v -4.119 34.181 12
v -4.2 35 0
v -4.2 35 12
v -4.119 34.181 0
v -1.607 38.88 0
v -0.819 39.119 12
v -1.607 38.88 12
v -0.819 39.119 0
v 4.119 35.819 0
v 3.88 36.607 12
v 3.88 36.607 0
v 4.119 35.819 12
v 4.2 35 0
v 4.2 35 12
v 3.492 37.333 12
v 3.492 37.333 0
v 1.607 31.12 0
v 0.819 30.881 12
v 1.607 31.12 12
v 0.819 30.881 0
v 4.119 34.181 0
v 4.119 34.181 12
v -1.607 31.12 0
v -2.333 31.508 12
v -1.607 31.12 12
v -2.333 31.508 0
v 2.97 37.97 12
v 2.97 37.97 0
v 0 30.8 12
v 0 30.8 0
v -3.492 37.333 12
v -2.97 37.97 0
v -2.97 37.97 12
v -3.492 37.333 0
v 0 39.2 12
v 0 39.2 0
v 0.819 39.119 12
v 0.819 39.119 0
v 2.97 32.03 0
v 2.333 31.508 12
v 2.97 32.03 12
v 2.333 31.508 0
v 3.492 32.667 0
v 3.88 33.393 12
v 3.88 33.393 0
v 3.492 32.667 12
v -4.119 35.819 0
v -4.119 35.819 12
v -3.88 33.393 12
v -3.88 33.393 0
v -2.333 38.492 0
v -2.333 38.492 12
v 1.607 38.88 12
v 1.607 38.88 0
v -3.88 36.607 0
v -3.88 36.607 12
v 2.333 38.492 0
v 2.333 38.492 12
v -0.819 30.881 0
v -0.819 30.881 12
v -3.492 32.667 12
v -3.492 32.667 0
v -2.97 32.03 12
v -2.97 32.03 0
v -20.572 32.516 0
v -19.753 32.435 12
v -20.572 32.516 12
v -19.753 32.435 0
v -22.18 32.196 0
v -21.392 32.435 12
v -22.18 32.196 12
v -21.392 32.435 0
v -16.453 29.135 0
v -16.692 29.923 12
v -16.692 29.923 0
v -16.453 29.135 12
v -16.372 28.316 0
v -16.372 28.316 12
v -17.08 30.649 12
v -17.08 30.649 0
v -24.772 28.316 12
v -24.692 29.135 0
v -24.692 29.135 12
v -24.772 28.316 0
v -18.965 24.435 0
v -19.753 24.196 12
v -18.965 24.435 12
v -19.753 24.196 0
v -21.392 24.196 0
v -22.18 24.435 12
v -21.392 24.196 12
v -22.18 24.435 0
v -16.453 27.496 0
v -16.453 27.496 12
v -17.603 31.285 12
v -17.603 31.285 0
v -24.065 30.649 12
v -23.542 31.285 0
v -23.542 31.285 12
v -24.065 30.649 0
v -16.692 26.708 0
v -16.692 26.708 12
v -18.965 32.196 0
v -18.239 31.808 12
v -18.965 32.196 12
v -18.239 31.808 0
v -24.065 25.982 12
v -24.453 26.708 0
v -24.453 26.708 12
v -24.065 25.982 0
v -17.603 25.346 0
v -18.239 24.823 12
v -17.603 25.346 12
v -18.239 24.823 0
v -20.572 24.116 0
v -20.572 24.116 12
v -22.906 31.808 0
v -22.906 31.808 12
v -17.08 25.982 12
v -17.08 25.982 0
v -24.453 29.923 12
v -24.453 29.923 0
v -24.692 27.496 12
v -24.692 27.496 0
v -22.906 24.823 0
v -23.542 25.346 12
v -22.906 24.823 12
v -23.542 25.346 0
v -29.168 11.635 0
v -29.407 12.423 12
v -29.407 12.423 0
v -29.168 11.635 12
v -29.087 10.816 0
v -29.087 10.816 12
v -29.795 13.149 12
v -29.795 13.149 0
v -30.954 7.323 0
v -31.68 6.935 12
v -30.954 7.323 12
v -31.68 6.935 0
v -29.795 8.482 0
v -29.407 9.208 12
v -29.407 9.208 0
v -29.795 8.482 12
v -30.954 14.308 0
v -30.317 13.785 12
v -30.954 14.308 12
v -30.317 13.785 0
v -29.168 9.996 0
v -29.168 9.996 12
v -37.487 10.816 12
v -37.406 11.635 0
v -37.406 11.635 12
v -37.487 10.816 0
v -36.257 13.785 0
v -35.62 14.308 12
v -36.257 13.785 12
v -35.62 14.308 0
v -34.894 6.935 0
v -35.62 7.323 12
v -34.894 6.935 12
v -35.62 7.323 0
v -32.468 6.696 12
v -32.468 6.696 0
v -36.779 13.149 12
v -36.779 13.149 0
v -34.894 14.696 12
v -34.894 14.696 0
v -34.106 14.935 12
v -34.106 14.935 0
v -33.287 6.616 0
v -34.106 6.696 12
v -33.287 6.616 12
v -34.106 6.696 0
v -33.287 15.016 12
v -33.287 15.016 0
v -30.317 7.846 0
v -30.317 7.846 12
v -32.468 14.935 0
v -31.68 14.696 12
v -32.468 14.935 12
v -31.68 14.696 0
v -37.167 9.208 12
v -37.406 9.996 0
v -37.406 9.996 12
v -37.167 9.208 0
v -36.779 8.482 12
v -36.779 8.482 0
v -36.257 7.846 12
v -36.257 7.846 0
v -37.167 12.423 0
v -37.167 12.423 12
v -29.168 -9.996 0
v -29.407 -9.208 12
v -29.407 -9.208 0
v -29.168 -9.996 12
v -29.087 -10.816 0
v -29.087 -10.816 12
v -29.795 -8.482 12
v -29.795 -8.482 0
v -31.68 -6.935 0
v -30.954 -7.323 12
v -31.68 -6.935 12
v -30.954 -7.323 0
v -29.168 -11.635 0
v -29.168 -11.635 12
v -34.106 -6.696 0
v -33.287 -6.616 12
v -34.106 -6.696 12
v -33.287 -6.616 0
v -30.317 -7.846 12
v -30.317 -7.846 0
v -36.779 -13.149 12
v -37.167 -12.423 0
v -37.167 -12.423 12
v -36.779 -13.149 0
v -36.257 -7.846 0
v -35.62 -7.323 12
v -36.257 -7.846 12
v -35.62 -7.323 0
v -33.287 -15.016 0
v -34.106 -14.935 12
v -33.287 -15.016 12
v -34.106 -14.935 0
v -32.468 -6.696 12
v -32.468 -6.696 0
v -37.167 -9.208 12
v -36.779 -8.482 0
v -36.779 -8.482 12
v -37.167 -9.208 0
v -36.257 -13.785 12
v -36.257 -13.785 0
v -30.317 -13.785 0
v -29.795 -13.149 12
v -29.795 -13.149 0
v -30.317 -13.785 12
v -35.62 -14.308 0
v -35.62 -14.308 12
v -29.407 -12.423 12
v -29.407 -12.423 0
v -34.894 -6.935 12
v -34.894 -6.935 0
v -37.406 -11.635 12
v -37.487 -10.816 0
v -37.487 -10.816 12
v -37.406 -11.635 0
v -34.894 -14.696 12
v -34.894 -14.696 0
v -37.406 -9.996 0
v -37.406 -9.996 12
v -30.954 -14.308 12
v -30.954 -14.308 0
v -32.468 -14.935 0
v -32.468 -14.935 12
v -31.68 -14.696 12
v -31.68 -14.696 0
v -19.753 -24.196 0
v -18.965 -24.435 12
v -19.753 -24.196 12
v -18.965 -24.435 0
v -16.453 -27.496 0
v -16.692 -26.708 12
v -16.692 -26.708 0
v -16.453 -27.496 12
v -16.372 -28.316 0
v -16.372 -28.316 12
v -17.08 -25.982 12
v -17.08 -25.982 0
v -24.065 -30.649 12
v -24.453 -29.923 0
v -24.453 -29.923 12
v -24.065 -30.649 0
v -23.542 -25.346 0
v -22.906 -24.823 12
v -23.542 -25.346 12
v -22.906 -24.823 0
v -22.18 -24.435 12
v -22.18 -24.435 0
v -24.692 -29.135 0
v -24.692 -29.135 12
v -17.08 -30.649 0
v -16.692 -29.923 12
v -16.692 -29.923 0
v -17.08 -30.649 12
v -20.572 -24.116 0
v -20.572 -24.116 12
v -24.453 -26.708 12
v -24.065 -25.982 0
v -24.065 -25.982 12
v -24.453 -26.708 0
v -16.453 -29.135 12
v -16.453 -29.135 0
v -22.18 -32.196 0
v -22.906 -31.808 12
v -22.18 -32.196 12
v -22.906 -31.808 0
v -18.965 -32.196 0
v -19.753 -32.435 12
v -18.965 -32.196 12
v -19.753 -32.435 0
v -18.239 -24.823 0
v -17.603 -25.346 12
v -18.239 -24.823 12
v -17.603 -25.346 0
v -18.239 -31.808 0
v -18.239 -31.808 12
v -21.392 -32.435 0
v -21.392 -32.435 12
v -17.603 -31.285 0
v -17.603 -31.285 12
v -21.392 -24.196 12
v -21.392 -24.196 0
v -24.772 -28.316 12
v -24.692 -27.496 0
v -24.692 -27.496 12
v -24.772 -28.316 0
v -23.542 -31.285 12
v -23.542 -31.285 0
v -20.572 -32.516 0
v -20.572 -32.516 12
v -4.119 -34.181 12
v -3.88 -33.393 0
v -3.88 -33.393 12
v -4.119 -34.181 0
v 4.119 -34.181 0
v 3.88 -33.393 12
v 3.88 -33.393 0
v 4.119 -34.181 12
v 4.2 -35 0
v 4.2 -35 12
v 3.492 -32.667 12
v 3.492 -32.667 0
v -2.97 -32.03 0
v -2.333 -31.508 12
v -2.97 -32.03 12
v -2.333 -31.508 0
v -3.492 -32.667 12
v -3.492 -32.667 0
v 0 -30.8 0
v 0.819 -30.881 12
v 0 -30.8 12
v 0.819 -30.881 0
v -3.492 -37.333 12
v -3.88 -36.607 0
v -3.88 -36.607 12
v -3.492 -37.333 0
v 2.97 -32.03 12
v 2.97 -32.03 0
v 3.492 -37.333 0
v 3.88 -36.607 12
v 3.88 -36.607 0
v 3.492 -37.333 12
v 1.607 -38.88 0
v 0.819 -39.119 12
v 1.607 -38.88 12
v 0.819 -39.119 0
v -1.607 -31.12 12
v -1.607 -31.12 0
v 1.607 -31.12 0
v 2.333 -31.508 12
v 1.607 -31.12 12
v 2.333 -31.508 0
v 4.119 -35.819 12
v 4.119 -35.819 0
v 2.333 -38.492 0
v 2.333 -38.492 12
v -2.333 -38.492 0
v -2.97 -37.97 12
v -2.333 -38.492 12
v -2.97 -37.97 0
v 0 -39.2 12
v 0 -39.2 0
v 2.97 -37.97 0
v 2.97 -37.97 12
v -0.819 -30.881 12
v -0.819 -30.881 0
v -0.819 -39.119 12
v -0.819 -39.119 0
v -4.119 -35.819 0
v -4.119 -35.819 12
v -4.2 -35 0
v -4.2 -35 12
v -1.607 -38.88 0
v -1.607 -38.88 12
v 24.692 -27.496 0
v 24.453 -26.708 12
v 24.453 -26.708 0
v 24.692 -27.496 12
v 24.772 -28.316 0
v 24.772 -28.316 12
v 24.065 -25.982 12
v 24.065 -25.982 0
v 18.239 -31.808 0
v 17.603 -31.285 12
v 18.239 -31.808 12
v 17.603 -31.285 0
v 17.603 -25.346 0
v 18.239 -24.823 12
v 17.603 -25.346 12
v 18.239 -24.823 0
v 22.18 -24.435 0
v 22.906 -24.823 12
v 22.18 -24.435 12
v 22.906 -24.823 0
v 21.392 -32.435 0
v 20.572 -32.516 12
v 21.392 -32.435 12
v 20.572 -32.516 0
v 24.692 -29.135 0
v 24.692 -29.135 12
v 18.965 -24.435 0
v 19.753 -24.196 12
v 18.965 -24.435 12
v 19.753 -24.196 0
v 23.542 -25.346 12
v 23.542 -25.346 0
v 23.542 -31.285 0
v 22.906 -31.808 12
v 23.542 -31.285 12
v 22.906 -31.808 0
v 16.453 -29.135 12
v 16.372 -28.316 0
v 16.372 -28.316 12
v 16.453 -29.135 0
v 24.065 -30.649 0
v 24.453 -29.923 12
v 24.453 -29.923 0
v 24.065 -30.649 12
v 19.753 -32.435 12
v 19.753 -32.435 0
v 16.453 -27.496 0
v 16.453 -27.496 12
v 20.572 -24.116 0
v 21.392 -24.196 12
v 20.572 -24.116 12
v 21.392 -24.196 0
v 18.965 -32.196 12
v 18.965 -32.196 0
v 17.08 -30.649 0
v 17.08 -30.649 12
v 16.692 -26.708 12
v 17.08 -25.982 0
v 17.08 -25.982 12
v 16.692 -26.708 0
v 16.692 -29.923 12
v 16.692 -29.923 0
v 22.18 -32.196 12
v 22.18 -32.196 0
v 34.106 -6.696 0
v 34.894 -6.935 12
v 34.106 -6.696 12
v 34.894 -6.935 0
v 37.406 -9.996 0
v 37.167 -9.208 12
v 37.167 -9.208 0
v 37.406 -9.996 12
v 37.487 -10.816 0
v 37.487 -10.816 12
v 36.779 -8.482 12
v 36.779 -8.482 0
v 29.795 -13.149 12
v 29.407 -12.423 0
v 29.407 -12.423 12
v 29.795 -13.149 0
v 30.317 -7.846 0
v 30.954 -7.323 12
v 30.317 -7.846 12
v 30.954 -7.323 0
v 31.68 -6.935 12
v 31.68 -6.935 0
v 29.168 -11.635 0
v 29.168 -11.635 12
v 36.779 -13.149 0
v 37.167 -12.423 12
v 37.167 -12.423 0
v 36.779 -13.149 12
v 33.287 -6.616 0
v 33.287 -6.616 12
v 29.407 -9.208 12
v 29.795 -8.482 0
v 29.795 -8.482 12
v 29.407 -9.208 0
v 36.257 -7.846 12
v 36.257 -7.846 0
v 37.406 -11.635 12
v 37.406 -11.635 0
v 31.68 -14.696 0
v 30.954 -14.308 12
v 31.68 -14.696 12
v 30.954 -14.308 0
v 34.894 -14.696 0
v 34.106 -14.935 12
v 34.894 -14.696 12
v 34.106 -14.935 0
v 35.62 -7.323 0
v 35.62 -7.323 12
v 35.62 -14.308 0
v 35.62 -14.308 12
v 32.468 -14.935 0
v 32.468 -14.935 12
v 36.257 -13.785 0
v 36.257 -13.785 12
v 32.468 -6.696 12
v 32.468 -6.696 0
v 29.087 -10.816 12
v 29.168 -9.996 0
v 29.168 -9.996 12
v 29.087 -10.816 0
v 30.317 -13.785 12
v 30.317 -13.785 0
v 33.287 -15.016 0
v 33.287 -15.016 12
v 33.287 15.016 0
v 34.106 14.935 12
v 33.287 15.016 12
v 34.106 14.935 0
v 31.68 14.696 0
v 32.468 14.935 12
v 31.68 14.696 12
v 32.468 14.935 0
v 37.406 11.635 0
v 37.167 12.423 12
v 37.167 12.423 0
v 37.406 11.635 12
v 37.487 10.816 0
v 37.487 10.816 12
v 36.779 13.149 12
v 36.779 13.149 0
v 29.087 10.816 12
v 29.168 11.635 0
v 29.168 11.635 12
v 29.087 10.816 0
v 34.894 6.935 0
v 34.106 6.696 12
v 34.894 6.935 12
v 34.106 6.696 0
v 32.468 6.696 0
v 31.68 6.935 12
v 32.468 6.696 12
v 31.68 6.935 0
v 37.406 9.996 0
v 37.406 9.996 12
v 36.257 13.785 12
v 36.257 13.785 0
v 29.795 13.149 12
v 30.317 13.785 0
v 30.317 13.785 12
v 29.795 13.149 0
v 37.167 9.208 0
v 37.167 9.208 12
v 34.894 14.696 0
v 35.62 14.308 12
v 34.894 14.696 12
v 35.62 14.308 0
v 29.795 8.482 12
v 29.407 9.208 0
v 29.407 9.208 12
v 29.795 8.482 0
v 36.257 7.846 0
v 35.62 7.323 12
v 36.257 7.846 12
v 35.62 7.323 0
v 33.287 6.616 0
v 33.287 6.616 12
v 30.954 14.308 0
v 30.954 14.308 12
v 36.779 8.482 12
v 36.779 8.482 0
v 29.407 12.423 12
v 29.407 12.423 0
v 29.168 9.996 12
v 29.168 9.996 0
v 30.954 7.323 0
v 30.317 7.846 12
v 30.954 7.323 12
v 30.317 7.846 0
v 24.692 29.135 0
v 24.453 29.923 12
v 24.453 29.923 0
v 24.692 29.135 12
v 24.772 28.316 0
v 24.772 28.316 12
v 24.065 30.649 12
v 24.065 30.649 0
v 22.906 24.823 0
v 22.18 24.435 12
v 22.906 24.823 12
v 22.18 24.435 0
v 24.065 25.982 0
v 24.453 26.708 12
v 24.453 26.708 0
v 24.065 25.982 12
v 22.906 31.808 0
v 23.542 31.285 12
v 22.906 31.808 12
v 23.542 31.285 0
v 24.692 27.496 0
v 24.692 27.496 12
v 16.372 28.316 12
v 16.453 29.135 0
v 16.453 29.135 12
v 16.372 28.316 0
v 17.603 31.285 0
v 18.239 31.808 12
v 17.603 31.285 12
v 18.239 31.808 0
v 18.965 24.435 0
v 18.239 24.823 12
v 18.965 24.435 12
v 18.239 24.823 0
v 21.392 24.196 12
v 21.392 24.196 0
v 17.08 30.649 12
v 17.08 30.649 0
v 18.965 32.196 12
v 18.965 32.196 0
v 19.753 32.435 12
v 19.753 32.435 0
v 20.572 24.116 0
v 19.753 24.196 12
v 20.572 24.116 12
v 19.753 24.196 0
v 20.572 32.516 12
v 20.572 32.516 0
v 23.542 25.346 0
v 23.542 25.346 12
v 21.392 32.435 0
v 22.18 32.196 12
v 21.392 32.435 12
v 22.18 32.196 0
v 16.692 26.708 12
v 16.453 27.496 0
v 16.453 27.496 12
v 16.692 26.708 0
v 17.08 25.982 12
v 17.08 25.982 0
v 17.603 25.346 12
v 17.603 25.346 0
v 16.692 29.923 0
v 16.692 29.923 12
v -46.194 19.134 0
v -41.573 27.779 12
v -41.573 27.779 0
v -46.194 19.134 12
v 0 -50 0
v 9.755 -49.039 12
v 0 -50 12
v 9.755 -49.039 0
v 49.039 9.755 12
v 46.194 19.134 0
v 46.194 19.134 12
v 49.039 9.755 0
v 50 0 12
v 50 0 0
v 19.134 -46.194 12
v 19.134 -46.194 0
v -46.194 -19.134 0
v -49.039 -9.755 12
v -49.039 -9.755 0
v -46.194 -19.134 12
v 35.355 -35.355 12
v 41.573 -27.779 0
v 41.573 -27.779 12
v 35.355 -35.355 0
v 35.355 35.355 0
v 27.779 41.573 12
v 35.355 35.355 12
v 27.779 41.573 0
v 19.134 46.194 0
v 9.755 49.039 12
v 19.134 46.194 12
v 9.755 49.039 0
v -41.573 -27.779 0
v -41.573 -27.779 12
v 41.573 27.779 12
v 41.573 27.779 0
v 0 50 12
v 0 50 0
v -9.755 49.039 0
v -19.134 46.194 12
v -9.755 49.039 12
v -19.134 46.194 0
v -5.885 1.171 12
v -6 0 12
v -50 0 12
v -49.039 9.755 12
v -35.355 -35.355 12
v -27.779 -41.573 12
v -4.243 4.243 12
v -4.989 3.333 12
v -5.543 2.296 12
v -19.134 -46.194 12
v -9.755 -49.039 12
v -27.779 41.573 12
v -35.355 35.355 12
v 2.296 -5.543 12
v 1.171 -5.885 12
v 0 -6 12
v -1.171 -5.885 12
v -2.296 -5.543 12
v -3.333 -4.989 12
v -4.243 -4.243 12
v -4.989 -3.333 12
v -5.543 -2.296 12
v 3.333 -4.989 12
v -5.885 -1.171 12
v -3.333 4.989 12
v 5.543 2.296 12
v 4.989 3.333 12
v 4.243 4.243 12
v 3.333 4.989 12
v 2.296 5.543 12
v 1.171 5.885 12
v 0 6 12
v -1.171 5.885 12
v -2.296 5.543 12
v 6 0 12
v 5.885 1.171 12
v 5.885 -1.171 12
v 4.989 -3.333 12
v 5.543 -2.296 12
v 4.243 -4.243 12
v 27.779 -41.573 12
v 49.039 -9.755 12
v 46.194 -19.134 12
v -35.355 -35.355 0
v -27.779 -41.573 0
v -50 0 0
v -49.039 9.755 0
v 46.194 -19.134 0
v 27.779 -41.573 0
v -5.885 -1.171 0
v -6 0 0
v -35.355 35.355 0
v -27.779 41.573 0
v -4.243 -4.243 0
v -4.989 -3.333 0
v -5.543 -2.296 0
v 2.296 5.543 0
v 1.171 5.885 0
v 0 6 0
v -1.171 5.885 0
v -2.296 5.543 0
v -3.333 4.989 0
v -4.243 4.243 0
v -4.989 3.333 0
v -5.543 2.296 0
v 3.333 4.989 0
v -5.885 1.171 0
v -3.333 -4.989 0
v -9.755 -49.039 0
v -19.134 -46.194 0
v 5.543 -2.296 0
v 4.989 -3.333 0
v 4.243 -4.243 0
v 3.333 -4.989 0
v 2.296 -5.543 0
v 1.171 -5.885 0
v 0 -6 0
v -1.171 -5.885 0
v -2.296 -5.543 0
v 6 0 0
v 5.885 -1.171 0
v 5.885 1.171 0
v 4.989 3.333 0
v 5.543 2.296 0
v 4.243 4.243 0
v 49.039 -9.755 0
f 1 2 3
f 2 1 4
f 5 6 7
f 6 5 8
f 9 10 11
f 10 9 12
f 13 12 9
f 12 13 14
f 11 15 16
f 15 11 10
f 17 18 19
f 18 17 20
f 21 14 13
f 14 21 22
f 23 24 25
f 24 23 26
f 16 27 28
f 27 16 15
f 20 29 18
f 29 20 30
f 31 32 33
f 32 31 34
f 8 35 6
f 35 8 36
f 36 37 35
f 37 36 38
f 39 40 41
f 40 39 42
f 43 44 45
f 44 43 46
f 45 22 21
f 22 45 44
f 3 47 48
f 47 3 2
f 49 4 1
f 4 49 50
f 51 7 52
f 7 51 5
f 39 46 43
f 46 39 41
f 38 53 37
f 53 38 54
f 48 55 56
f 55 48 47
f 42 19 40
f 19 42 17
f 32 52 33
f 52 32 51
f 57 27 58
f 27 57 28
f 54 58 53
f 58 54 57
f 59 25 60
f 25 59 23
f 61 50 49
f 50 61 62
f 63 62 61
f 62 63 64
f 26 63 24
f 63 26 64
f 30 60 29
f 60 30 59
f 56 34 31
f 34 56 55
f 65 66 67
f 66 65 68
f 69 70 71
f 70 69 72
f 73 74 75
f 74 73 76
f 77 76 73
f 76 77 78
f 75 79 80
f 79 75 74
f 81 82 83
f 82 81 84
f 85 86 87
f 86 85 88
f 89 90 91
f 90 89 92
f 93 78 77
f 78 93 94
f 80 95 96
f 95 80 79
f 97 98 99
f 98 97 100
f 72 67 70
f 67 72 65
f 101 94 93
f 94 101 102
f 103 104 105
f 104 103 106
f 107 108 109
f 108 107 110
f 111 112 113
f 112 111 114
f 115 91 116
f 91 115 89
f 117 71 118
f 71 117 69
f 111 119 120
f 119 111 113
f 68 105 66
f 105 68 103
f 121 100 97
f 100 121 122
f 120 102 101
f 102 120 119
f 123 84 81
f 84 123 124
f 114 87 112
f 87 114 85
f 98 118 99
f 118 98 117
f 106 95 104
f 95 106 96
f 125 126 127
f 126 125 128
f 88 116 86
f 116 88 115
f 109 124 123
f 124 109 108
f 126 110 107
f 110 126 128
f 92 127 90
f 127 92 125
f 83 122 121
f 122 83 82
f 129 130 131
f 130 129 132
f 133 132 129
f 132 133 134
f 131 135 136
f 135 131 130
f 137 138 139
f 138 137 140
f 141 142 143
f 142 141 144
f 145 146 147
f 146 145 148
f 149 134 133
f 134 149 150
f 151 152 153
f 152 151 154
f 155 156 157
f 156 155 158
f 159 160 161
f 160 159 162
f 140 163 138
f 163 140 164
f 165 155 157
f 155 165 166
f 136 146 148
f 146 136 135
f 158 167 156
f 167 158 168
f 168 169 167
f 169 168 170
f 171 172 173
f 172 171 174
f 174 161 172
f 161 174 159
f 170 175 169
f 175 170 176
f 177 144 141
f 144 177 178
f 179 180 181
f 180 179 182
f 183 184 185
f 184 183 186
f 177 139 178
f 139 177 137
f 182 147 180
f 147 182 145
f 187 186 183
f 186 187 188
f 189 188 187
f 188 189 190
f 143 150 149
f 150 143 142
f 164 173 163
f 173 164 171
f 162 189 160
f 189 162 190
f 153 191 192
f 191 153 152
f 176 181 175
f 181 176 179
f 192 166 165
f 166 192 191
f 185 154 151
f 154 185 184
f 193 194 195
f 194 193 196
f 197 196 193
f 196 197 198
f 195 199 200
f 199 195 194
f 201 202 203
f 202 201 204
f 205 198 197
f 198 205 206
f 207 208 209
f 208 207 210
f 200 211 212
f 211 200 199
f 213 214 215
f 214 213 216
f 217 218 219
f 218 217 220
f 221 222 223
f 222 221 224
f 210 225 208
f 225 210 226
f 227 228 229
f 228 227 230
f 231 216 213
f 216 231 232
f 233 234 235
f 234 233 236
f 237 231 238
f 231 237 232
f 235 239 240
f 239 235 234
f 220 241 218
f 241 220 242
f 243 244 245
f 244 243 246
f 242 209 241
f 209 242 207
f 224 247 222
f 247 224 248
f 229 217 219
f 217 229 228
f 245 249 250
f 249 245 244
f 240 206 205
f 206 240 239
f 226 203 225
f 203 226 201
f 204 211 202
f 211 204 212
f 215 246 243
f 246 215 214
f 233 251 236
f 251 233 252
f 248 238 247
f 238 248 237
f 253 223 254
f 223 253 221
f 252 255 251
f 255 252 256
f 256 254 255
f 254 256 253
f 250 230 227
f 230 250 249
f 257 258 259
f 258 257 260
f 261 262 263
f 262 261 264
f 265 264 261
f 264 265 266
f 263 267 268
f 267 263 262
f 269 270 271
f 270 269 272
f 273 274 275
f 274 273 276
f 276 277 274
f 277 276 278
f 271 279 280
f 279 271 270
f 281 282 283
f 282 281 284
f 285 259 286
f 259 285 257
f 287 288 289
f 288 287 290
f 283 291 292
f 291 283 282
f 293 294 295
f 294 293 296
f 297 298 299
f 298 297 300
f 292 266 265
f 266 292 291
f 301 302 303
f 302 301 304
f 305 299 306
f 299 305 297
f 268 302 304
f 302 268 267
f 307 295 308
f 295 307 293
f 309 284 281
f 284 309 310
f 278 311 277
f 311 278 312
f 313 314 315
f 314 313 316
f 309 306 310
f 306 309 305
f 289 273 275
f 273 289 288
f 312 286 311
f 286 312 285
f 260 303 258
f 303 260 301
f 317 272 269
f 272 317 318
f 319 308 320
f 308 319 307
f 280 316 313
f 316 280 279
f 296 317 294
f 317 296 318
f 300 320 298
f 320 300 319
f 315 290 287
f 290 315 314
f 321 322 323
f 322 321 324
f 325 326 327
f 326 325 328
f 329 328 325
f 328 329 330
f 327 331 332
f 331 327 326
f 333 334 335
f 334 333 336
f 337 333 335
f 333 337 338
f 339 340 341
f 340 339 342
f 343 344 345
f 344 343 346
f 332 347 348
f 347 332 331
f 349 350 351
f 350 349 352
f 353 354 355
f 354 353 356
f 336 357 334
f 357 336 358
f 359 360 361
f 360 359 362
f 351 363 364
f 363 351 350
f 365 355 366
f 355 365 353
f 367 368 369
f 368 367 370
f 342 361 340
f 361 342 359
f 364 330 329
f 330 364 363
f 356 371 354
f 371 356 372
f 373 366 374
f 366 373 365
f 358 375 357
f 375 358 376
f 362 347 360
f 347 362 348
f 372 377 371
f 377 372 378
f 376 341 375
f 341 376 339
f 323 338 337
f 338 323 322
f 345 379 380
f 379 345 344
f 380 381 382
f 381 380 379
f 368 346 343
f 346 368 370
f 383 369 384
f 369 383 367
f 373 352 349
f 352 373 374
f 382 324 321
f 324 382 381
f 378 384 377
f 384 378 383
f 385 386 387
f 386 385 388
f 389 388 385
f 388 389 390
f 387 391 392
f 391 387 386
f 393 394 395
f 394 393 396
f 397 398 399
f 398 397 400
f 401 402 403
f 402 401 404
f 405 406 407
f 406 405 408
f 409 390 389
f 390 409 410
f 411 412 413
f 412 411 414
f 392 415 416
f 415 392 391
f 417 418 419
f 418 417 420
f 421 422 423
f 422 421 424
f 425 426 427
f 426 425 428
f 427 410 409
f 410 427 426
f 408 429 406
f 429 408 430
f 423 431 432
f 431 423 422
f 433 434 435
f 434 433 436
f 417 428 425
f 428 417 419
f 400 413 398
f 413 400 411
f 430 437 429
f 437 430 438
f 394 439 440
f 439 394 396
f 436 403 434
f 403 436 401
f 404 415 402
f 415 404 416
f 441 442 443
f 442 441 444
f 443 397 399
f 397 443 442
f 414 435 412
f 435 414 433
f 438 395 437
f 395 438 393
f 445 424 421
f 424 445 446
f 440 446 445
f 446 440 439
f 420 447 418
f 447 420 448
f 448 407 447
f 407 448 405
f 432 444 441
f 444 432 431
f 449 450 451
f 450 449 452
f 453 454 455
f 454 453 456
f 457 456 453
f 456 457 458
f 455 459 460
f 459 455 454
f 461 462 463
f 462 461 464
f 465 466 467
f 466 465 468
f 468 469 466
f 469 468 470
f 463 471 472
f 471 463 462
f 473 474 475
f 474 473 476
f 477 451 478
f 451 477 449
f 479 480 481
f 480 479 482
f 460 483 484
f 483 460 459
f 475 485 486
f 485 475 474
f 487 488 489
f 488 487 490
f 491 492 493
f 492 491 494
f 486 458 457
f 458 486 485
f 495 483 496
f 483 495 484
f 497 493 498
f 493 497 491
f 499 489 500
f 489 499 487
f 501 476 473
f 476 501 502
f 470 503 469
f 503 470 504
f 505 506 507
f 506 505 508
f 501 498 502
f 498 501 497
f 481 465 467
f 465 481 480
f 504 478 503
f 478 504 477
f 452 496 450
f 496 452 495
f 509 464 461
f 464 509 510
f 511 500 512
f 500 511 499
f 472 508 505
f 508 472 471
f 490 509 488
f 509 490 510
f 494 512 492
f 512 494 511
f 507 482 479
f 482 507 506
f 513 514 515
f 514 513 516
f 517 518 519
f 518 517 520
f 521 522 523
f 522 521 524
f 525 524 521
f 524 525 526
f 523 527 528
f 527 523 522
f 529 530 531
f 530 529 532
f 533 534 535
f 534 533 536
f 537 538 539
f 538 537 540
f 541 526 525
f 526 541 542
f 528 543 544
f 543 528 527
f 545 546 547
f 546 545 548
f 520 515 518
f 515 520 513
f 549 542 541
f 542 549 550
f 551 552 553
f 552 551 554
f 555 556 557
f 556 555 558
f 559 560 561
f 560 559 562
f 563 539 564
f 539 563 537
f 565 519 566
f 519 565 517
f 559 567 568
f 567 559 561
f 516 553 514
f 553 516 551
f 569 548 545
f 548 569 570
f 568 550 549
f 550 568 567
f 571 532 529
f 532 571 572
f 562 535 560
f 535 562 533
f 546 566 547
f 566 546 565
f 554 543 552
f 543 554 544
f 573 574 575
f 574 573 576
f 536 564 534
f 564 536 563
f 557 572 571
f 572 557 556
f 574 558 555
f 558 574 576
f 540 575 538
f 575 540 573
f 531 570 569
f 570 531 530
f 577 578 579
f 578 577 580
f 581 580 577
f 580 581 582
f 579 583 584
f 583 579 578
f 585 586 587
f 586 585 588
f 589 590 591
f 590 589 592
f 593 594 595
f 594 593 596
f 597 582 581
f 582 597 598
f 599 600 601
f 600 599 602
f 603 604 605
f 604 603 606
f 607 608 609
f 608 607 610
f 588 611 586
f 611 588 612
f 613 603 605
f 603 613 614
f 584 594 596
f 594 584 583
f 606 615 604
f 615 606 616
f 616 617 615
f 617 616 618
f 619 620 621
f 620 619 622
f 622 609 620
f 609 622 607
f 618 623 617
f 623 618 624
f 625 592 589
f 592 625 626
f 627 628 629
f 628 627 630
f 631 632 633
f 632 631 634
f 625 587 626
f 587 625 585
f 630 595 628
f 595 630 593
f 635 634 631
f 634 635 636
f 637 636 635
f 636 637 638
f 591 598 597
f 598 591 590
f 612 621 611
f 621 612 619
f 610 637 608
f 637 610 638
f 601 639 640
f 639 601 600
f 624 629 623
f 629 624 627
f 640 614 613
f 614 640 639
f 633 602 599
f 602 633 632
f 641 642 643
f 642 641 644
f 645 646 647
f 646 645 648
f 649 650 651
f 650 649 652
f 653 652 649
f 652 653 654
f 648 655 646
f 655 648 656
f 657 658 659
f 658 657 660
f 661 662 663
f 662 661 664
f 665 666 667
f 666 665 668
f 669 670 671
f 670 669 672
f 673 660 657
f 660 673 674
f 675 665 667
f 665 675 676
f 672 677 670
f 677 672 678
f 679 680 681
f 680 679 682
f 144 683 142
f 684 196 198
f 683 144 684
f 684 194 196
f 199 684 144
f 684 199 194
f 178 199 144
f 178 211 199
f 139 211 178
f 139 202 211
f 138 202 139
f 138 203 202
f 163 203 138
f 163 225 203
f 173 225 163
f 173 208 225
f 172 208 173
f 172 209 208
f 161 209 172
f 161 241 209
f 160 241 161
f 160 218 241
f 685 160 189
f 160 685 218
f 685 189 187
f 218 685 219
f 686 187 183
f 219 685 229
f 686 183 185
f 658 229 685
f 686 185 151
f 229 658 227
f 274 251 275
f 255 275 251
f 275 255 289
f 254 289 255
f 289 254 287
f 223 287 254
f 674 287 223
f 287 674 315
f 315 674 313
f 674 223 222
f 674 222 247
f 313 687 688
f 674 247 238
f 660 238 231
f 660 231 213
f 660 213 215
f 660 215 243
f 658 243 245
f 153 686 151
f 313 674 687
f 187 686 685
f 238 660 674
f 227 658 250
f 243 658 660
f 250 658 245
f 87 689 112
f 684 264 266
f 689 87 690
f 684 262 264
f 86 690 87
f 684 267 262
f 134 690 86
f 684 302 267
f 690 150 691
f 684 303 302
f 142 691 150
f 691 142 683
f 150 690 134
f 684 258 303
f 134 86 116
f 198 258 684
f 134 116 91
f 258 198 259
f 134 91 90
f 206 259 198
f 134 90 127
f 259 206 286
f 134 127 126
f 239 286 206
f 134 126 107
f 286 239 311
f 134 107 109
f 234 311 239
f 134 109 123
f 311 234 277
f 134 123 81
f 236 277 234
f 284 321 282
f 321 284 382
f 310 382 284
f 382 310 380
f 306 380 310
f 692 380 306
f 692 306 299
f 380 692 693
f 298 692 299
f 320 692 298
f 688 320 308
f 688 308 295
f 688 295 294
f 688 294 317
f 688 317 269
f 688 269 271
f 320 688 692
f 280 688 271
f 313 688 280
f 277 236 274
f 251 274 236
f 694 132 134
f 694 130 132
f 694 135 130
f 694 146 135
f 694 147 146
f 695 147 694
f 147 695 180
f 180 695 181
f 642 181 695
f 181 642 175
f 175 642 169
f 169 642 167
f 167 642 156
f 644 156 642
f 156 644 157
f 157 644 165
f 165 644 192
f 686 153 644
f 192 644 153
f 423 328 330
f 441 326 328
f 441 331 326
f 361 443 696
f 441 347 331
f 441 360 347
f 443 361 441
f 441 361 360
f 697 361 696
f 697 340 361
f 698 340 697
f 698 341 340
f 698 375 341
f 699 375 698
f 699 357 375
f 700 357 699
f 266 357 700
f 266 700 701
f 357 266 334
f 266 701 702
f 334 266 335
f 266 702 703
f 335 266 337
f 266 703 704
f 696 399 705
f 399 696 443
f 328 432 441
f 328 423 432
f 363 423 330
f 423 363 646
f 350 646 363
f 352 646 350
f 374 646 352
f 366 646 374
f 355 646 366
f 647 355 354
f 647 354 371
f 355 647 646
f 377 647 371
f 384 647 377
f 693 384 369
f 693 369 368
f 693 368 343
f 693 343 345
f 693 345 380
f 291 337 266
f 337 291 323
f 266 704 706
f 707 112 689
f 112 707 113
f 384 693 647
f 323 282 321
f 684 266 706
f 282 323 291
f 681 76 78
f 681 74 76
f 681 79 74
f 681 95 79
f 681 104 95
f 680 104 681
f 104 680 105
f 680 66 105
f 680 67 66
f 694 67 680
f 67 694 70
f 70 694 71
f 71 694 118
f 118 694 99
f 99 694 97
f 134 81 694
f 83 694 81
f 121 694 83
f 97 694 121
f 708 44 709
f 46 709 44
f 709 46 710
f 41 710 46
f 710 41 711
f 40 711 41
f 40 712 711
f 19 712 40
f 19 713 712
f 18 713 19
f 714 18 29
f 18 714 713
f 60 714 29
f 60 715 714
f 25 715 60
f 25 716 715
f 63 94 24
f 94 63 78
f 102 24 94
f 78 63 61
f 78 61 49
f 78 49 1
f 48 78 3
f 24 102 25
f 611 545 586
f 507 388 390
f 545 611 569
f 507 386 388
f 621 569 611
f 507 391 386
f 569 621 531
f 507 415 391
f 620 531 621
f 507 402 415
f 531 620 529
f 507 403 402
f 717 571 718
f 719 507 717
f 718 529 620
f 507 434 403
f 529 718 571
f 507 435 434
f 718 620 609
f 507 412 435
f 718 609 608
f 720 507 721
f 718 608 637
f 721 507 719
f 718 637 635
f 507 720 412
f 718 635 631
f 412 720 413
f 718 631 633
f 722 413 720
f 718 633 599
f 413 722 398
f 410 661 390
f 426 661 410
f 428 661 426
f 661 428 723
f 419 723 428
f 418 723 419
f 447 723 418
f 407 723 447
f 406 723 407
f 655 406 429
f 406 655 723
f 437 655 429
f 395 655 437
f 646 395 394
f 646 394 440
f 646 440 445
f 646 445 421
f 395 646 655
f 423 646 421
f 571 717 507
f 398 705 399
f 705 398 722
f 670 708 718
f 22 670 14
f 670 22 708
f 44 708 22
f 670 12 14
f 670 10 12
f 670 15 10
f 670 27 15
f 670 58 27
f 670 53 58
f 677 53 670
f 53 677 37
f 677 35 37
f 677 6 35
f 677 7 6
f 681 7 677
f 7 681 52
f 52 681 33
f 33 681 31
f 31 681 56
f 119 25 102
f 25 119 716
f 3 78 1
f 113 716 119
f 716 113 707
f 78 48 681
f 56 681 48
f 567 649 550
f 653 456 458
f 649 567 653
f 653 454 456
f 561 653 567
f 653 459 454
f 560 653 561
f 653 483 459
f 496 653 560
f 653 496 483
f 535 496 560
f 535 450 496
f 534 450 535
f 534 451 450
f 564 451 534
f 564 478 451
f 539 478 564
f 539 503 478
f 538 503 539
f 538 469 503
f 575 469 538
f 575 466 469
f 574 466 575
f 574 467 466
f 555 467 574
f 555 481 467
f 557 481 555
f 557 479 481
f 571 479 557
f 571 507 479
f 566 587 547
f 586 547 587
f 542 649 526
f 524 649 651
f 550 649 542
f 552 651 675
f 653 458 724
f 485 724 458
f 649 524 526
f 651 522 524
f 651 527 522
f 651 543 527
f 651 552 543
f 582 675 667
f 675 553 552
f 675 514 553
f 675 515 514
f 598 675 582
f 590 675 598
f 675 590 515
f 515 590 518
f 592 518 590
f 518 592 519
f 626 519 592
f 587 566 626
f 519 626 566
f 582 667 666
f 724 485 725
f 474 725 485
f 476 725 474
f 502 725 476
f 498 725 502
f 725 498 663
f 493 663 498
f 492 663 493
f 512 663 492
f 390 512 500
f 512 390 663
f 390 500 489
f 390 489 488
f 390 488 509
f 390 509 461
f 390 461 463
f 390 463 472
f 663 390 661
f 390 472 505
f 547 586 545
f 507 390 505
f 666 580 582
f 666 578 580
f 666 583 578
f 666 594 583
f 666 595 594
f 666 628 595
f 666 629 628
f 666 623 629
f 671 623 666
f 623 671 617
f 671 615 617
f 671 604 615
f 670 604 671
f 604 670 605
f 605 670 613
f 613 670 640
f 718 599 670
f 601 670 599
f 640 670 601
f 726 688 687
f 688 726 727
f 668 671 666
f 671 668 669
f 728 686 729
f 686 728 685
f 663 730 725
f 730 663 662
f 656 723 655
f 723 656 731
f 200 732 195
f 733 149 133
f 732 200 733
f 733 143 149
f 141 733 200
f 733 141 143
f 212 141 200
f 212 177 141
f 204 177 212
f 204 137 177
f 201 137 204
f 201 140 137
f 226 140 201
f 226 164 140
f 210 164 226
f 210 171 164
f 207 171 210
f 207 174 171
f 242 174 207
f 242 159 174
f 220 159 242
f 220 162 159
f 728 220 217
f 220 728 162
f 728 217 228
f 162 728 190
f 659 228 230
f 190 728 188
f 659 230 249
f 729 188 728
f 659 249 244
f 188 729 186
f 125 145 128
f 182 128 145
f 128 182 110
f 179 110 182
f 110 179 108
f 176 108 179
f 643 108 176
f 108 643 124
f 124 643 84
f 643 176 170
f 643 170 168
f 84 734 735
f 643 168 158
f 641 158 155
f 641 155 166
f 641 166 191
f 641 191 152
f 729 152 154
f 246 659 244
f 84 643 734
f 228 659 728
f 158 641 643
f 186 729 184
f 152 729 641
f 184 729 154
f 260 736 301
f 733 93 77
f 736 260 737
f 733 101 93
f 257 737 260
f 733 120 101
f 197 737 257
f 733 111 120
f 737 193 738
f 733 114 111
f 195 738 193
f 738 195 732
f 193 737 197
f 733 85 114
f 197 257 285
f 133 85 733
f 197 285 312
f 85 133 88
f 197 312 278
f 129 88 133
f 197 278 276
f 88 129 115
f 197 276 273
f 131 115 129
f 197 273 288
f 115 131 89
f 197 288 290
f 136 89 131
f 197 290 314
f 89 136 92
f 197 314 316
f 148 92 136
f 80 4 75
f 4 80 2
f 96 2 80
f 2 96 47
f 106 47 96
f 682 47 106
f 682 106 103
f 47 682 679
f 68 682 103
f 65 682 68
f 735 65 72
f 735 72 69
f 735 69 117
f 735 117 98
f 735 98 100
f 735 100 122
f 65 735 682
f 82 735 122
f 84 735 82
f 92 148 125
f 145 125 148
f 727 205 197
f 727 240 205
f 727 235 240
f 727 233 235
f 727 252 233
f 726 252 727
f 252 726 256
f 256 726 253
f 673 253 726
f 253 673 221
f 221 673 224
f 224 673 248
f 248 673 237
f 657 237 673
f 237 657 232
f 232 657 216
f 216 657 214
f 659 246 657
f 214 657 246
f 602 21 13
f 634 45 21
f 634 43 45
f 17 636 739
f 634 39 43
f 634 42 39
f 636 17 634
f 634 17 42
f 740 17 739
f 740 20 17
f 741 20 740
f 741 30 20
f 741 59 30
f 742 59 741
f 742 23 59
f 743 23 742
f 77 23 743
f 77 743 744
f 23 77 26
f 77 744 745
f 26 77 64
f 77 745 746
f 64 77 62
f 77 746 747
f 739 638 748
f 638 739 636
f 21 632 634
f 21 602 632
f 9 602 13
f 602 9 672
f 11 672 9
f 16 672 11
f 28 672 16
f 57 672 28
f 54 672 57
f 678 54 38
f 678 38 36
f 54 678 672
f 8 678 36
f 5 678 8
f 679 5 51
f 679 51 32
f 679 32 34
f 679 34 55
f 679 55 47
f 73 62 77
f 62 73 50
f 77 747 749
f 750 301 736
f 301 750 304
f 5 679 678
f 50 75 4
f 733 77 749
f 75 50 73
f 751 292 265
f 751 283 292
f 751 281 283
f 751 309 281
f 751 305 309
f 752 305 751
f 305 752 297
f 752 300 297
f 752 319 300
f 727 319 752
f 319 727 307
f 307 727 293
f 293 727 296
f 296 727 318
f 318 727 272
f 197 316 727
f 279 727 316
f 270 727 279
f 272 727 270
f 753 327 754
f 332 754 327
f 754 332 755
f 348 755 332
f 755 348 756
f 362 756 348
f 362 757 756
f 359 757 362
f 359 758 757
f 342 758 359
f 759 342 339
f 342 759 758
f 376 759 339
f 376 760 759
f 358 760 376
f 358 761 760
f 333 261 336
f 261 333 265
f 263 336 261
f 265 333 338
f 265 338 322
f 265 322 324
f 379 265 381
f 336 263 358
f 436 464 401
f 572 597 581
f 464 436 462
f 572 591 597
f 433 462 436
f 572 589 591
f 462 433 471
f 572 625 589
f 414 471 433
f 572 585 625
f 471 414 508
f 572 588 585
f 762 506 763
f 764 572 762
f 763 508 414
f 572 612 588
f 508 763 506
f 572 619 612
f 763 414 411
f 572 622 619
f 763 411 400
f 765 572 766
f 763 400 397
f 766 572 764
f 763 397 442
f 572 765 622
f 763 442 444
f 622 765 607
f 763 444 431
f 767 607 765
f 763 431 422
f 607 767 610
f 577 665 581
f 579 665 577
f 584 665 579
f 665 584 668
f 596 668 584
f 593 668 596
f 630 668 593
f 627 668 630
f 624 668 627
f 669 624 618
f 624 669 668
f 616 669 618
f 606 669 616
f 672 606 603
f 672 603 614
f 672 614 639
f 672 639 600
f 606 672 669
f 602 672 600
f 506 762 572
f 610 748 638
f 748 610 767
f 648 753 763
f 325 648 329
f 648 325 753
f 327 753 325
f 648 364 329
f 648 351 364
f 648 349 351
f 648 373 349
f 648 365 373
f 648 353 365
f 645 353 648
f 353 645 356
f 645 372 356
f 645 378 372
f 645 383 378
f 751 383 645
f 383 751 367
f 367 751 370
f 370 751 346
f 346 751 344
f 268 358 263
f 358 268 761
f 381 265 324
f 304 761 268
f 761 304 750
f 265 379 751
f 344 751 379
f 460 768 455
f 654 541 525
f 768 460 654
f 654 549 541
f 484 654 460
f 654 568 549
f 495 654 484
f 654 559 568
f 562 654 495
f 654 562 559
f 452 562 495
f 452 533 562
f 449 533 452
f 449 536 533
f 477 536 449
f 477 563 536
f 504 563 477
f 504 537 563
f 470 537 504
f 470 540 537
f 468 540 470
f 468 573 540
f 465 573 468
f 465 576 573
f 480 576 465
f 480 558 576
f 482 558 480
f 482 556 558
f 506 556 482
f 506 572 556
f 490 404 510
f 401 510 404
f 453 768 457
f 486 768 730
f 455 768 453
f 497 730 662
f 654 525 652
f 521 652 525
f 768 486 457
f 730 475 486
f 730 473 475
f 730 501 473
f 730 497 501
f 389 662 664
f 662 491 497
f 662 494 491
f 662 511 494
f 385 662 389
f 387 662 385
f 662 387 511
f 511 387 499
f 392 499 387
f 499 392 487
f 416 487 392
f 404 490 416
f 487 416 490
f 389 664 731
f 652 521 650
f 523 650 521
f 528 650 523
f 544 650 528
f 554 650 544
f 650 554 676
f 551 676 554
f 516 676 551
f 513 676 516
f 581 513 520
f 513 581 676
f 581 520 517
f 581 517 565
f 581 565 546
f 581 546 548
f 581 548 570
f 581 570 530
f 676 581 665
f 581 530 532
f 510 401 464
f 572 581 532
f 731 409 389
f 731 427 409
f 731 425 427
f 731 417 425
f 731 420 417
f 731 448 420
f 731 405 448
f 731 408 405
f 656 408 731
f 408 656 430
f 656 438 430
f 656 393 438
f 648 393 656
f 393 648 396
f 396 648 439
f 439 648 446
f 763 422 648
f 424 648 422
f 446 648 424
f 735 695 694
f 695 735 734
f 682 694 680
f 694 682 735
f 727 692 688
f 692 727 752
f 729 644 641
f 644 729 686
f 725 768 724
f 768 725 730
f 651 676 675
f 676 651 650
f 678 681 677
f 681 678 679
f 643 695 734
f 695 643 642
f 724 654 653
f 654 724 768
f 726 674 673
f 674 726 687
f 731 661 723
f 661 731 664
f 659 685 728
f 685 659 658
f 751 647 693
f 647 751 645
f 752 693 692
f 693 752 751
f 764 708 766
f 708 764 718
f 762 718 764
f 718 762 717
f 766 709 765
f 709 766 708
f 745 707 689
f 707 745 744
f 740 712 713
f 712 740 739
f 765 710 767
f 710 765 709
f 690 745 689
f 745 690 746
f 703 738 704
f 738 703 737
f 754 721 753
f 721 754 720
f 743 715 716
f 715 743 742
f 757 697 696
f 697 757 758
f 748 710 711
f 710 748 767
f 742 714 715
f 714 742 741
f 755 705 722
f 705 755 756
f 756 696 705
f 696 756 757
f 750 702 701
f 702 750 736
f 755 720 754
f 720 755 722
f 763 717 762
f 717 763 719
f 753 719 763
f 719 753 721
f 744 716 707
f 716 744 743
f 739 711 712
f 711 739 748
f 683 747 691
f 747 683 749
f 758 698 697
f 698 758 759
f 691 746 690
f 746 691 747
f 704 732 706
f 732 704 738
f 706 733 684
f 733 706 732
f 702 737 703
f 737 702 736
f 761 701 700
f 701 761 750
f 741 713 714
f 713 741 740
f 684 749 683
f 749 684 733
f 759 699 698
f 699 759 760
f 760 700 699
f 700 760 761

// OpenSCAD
$fn = 32;

// ----------------------------------------------------------------------
// Flange Ø100 x 12
// 10 holes on a Ø70 bolt circle, bolted joints
// ----------------------------------------------------------------------

// --- parameters (mm) ---
flange_d = 100;  // outside diameter of the flange
thickness = 12;  // flange thickness
holes = 10;      // number of bolt holes
pcd = 70;        // bolt circle diameter
start_deg = 90;  // angle of the first hole, from +X
hole_d = 8.4;    // bolt hole diameter
bore_d = 12;     // central through bore
hub_d = 20;      // hub outside diameter
hub_h = 0;       // hub height above the flange face (0 = no hub)

// --- derived feature positions (mm) ---
height = thickness + hub_h;  // = 12   overall height of the part
pcd_r = pcd / 2;             // = 35   bolt circle radius
hole_step = 360 / holes;     // = 36   angular pitch
feature_centers = [
  [pcd_r * cos(start_deg + 0 * hole_step), pcd_r * sin(start_deg + 0 * hole_step)],
  [pcd_r * cos(start_deg + 1 * hole_step), pcd_r * sin(start_deg + 1 * hole_step)],
  [pcd_r * cos(start_deg + 2 * hole_step), pcd_r * sin(start_deg + 2 * hole_step)],
  [pcd_r * cos(start_deg + 3 * hole_step), pcd_r * sin(start_deg + 3 * hole_step)],
  [pcd_r * cos(start_deg + 4 * hole_step), pcd_r * sin(start_deg + 4 * hole_step)],
  [pcd_r * cos(start_deg + 5 * hole_step), pcd_r * sin(start_deg + 5 * hole_step)],
  [pcd_r * cos(start_deg + 6 * hole_step), pcd_r * sin(start_deg + 6 * hole_step)],
  [pcd_r * cos(start_deg + 7 * hole_step), pcd_r * sin(start_deg + 7 * hole_step)],
  [pcd_r * cos(start_deg + 8 * hole_step), pcd_r * sin(start_deg + 8 * hole_step)],
  [pcd_r * cos(start_deg + 9 * hole_step), pcd_r * sin(start_deg + 9 * hole_step)]
];   // bolt hole centres on the pitch circle

// flange disc, every hole and the bore cut straight through
difference() {
  union() {
    cylinder(d = flange_d, h = thickness);
  }
  translate([0, 0, -1]) cylinder(d = bore_d, h = height + 2);  // bore, through
  for (centre = feature_centers)
    translate([centre[0], centre[1], -1]) cylinder(d = hole_d, h = thickness + 2);
}
